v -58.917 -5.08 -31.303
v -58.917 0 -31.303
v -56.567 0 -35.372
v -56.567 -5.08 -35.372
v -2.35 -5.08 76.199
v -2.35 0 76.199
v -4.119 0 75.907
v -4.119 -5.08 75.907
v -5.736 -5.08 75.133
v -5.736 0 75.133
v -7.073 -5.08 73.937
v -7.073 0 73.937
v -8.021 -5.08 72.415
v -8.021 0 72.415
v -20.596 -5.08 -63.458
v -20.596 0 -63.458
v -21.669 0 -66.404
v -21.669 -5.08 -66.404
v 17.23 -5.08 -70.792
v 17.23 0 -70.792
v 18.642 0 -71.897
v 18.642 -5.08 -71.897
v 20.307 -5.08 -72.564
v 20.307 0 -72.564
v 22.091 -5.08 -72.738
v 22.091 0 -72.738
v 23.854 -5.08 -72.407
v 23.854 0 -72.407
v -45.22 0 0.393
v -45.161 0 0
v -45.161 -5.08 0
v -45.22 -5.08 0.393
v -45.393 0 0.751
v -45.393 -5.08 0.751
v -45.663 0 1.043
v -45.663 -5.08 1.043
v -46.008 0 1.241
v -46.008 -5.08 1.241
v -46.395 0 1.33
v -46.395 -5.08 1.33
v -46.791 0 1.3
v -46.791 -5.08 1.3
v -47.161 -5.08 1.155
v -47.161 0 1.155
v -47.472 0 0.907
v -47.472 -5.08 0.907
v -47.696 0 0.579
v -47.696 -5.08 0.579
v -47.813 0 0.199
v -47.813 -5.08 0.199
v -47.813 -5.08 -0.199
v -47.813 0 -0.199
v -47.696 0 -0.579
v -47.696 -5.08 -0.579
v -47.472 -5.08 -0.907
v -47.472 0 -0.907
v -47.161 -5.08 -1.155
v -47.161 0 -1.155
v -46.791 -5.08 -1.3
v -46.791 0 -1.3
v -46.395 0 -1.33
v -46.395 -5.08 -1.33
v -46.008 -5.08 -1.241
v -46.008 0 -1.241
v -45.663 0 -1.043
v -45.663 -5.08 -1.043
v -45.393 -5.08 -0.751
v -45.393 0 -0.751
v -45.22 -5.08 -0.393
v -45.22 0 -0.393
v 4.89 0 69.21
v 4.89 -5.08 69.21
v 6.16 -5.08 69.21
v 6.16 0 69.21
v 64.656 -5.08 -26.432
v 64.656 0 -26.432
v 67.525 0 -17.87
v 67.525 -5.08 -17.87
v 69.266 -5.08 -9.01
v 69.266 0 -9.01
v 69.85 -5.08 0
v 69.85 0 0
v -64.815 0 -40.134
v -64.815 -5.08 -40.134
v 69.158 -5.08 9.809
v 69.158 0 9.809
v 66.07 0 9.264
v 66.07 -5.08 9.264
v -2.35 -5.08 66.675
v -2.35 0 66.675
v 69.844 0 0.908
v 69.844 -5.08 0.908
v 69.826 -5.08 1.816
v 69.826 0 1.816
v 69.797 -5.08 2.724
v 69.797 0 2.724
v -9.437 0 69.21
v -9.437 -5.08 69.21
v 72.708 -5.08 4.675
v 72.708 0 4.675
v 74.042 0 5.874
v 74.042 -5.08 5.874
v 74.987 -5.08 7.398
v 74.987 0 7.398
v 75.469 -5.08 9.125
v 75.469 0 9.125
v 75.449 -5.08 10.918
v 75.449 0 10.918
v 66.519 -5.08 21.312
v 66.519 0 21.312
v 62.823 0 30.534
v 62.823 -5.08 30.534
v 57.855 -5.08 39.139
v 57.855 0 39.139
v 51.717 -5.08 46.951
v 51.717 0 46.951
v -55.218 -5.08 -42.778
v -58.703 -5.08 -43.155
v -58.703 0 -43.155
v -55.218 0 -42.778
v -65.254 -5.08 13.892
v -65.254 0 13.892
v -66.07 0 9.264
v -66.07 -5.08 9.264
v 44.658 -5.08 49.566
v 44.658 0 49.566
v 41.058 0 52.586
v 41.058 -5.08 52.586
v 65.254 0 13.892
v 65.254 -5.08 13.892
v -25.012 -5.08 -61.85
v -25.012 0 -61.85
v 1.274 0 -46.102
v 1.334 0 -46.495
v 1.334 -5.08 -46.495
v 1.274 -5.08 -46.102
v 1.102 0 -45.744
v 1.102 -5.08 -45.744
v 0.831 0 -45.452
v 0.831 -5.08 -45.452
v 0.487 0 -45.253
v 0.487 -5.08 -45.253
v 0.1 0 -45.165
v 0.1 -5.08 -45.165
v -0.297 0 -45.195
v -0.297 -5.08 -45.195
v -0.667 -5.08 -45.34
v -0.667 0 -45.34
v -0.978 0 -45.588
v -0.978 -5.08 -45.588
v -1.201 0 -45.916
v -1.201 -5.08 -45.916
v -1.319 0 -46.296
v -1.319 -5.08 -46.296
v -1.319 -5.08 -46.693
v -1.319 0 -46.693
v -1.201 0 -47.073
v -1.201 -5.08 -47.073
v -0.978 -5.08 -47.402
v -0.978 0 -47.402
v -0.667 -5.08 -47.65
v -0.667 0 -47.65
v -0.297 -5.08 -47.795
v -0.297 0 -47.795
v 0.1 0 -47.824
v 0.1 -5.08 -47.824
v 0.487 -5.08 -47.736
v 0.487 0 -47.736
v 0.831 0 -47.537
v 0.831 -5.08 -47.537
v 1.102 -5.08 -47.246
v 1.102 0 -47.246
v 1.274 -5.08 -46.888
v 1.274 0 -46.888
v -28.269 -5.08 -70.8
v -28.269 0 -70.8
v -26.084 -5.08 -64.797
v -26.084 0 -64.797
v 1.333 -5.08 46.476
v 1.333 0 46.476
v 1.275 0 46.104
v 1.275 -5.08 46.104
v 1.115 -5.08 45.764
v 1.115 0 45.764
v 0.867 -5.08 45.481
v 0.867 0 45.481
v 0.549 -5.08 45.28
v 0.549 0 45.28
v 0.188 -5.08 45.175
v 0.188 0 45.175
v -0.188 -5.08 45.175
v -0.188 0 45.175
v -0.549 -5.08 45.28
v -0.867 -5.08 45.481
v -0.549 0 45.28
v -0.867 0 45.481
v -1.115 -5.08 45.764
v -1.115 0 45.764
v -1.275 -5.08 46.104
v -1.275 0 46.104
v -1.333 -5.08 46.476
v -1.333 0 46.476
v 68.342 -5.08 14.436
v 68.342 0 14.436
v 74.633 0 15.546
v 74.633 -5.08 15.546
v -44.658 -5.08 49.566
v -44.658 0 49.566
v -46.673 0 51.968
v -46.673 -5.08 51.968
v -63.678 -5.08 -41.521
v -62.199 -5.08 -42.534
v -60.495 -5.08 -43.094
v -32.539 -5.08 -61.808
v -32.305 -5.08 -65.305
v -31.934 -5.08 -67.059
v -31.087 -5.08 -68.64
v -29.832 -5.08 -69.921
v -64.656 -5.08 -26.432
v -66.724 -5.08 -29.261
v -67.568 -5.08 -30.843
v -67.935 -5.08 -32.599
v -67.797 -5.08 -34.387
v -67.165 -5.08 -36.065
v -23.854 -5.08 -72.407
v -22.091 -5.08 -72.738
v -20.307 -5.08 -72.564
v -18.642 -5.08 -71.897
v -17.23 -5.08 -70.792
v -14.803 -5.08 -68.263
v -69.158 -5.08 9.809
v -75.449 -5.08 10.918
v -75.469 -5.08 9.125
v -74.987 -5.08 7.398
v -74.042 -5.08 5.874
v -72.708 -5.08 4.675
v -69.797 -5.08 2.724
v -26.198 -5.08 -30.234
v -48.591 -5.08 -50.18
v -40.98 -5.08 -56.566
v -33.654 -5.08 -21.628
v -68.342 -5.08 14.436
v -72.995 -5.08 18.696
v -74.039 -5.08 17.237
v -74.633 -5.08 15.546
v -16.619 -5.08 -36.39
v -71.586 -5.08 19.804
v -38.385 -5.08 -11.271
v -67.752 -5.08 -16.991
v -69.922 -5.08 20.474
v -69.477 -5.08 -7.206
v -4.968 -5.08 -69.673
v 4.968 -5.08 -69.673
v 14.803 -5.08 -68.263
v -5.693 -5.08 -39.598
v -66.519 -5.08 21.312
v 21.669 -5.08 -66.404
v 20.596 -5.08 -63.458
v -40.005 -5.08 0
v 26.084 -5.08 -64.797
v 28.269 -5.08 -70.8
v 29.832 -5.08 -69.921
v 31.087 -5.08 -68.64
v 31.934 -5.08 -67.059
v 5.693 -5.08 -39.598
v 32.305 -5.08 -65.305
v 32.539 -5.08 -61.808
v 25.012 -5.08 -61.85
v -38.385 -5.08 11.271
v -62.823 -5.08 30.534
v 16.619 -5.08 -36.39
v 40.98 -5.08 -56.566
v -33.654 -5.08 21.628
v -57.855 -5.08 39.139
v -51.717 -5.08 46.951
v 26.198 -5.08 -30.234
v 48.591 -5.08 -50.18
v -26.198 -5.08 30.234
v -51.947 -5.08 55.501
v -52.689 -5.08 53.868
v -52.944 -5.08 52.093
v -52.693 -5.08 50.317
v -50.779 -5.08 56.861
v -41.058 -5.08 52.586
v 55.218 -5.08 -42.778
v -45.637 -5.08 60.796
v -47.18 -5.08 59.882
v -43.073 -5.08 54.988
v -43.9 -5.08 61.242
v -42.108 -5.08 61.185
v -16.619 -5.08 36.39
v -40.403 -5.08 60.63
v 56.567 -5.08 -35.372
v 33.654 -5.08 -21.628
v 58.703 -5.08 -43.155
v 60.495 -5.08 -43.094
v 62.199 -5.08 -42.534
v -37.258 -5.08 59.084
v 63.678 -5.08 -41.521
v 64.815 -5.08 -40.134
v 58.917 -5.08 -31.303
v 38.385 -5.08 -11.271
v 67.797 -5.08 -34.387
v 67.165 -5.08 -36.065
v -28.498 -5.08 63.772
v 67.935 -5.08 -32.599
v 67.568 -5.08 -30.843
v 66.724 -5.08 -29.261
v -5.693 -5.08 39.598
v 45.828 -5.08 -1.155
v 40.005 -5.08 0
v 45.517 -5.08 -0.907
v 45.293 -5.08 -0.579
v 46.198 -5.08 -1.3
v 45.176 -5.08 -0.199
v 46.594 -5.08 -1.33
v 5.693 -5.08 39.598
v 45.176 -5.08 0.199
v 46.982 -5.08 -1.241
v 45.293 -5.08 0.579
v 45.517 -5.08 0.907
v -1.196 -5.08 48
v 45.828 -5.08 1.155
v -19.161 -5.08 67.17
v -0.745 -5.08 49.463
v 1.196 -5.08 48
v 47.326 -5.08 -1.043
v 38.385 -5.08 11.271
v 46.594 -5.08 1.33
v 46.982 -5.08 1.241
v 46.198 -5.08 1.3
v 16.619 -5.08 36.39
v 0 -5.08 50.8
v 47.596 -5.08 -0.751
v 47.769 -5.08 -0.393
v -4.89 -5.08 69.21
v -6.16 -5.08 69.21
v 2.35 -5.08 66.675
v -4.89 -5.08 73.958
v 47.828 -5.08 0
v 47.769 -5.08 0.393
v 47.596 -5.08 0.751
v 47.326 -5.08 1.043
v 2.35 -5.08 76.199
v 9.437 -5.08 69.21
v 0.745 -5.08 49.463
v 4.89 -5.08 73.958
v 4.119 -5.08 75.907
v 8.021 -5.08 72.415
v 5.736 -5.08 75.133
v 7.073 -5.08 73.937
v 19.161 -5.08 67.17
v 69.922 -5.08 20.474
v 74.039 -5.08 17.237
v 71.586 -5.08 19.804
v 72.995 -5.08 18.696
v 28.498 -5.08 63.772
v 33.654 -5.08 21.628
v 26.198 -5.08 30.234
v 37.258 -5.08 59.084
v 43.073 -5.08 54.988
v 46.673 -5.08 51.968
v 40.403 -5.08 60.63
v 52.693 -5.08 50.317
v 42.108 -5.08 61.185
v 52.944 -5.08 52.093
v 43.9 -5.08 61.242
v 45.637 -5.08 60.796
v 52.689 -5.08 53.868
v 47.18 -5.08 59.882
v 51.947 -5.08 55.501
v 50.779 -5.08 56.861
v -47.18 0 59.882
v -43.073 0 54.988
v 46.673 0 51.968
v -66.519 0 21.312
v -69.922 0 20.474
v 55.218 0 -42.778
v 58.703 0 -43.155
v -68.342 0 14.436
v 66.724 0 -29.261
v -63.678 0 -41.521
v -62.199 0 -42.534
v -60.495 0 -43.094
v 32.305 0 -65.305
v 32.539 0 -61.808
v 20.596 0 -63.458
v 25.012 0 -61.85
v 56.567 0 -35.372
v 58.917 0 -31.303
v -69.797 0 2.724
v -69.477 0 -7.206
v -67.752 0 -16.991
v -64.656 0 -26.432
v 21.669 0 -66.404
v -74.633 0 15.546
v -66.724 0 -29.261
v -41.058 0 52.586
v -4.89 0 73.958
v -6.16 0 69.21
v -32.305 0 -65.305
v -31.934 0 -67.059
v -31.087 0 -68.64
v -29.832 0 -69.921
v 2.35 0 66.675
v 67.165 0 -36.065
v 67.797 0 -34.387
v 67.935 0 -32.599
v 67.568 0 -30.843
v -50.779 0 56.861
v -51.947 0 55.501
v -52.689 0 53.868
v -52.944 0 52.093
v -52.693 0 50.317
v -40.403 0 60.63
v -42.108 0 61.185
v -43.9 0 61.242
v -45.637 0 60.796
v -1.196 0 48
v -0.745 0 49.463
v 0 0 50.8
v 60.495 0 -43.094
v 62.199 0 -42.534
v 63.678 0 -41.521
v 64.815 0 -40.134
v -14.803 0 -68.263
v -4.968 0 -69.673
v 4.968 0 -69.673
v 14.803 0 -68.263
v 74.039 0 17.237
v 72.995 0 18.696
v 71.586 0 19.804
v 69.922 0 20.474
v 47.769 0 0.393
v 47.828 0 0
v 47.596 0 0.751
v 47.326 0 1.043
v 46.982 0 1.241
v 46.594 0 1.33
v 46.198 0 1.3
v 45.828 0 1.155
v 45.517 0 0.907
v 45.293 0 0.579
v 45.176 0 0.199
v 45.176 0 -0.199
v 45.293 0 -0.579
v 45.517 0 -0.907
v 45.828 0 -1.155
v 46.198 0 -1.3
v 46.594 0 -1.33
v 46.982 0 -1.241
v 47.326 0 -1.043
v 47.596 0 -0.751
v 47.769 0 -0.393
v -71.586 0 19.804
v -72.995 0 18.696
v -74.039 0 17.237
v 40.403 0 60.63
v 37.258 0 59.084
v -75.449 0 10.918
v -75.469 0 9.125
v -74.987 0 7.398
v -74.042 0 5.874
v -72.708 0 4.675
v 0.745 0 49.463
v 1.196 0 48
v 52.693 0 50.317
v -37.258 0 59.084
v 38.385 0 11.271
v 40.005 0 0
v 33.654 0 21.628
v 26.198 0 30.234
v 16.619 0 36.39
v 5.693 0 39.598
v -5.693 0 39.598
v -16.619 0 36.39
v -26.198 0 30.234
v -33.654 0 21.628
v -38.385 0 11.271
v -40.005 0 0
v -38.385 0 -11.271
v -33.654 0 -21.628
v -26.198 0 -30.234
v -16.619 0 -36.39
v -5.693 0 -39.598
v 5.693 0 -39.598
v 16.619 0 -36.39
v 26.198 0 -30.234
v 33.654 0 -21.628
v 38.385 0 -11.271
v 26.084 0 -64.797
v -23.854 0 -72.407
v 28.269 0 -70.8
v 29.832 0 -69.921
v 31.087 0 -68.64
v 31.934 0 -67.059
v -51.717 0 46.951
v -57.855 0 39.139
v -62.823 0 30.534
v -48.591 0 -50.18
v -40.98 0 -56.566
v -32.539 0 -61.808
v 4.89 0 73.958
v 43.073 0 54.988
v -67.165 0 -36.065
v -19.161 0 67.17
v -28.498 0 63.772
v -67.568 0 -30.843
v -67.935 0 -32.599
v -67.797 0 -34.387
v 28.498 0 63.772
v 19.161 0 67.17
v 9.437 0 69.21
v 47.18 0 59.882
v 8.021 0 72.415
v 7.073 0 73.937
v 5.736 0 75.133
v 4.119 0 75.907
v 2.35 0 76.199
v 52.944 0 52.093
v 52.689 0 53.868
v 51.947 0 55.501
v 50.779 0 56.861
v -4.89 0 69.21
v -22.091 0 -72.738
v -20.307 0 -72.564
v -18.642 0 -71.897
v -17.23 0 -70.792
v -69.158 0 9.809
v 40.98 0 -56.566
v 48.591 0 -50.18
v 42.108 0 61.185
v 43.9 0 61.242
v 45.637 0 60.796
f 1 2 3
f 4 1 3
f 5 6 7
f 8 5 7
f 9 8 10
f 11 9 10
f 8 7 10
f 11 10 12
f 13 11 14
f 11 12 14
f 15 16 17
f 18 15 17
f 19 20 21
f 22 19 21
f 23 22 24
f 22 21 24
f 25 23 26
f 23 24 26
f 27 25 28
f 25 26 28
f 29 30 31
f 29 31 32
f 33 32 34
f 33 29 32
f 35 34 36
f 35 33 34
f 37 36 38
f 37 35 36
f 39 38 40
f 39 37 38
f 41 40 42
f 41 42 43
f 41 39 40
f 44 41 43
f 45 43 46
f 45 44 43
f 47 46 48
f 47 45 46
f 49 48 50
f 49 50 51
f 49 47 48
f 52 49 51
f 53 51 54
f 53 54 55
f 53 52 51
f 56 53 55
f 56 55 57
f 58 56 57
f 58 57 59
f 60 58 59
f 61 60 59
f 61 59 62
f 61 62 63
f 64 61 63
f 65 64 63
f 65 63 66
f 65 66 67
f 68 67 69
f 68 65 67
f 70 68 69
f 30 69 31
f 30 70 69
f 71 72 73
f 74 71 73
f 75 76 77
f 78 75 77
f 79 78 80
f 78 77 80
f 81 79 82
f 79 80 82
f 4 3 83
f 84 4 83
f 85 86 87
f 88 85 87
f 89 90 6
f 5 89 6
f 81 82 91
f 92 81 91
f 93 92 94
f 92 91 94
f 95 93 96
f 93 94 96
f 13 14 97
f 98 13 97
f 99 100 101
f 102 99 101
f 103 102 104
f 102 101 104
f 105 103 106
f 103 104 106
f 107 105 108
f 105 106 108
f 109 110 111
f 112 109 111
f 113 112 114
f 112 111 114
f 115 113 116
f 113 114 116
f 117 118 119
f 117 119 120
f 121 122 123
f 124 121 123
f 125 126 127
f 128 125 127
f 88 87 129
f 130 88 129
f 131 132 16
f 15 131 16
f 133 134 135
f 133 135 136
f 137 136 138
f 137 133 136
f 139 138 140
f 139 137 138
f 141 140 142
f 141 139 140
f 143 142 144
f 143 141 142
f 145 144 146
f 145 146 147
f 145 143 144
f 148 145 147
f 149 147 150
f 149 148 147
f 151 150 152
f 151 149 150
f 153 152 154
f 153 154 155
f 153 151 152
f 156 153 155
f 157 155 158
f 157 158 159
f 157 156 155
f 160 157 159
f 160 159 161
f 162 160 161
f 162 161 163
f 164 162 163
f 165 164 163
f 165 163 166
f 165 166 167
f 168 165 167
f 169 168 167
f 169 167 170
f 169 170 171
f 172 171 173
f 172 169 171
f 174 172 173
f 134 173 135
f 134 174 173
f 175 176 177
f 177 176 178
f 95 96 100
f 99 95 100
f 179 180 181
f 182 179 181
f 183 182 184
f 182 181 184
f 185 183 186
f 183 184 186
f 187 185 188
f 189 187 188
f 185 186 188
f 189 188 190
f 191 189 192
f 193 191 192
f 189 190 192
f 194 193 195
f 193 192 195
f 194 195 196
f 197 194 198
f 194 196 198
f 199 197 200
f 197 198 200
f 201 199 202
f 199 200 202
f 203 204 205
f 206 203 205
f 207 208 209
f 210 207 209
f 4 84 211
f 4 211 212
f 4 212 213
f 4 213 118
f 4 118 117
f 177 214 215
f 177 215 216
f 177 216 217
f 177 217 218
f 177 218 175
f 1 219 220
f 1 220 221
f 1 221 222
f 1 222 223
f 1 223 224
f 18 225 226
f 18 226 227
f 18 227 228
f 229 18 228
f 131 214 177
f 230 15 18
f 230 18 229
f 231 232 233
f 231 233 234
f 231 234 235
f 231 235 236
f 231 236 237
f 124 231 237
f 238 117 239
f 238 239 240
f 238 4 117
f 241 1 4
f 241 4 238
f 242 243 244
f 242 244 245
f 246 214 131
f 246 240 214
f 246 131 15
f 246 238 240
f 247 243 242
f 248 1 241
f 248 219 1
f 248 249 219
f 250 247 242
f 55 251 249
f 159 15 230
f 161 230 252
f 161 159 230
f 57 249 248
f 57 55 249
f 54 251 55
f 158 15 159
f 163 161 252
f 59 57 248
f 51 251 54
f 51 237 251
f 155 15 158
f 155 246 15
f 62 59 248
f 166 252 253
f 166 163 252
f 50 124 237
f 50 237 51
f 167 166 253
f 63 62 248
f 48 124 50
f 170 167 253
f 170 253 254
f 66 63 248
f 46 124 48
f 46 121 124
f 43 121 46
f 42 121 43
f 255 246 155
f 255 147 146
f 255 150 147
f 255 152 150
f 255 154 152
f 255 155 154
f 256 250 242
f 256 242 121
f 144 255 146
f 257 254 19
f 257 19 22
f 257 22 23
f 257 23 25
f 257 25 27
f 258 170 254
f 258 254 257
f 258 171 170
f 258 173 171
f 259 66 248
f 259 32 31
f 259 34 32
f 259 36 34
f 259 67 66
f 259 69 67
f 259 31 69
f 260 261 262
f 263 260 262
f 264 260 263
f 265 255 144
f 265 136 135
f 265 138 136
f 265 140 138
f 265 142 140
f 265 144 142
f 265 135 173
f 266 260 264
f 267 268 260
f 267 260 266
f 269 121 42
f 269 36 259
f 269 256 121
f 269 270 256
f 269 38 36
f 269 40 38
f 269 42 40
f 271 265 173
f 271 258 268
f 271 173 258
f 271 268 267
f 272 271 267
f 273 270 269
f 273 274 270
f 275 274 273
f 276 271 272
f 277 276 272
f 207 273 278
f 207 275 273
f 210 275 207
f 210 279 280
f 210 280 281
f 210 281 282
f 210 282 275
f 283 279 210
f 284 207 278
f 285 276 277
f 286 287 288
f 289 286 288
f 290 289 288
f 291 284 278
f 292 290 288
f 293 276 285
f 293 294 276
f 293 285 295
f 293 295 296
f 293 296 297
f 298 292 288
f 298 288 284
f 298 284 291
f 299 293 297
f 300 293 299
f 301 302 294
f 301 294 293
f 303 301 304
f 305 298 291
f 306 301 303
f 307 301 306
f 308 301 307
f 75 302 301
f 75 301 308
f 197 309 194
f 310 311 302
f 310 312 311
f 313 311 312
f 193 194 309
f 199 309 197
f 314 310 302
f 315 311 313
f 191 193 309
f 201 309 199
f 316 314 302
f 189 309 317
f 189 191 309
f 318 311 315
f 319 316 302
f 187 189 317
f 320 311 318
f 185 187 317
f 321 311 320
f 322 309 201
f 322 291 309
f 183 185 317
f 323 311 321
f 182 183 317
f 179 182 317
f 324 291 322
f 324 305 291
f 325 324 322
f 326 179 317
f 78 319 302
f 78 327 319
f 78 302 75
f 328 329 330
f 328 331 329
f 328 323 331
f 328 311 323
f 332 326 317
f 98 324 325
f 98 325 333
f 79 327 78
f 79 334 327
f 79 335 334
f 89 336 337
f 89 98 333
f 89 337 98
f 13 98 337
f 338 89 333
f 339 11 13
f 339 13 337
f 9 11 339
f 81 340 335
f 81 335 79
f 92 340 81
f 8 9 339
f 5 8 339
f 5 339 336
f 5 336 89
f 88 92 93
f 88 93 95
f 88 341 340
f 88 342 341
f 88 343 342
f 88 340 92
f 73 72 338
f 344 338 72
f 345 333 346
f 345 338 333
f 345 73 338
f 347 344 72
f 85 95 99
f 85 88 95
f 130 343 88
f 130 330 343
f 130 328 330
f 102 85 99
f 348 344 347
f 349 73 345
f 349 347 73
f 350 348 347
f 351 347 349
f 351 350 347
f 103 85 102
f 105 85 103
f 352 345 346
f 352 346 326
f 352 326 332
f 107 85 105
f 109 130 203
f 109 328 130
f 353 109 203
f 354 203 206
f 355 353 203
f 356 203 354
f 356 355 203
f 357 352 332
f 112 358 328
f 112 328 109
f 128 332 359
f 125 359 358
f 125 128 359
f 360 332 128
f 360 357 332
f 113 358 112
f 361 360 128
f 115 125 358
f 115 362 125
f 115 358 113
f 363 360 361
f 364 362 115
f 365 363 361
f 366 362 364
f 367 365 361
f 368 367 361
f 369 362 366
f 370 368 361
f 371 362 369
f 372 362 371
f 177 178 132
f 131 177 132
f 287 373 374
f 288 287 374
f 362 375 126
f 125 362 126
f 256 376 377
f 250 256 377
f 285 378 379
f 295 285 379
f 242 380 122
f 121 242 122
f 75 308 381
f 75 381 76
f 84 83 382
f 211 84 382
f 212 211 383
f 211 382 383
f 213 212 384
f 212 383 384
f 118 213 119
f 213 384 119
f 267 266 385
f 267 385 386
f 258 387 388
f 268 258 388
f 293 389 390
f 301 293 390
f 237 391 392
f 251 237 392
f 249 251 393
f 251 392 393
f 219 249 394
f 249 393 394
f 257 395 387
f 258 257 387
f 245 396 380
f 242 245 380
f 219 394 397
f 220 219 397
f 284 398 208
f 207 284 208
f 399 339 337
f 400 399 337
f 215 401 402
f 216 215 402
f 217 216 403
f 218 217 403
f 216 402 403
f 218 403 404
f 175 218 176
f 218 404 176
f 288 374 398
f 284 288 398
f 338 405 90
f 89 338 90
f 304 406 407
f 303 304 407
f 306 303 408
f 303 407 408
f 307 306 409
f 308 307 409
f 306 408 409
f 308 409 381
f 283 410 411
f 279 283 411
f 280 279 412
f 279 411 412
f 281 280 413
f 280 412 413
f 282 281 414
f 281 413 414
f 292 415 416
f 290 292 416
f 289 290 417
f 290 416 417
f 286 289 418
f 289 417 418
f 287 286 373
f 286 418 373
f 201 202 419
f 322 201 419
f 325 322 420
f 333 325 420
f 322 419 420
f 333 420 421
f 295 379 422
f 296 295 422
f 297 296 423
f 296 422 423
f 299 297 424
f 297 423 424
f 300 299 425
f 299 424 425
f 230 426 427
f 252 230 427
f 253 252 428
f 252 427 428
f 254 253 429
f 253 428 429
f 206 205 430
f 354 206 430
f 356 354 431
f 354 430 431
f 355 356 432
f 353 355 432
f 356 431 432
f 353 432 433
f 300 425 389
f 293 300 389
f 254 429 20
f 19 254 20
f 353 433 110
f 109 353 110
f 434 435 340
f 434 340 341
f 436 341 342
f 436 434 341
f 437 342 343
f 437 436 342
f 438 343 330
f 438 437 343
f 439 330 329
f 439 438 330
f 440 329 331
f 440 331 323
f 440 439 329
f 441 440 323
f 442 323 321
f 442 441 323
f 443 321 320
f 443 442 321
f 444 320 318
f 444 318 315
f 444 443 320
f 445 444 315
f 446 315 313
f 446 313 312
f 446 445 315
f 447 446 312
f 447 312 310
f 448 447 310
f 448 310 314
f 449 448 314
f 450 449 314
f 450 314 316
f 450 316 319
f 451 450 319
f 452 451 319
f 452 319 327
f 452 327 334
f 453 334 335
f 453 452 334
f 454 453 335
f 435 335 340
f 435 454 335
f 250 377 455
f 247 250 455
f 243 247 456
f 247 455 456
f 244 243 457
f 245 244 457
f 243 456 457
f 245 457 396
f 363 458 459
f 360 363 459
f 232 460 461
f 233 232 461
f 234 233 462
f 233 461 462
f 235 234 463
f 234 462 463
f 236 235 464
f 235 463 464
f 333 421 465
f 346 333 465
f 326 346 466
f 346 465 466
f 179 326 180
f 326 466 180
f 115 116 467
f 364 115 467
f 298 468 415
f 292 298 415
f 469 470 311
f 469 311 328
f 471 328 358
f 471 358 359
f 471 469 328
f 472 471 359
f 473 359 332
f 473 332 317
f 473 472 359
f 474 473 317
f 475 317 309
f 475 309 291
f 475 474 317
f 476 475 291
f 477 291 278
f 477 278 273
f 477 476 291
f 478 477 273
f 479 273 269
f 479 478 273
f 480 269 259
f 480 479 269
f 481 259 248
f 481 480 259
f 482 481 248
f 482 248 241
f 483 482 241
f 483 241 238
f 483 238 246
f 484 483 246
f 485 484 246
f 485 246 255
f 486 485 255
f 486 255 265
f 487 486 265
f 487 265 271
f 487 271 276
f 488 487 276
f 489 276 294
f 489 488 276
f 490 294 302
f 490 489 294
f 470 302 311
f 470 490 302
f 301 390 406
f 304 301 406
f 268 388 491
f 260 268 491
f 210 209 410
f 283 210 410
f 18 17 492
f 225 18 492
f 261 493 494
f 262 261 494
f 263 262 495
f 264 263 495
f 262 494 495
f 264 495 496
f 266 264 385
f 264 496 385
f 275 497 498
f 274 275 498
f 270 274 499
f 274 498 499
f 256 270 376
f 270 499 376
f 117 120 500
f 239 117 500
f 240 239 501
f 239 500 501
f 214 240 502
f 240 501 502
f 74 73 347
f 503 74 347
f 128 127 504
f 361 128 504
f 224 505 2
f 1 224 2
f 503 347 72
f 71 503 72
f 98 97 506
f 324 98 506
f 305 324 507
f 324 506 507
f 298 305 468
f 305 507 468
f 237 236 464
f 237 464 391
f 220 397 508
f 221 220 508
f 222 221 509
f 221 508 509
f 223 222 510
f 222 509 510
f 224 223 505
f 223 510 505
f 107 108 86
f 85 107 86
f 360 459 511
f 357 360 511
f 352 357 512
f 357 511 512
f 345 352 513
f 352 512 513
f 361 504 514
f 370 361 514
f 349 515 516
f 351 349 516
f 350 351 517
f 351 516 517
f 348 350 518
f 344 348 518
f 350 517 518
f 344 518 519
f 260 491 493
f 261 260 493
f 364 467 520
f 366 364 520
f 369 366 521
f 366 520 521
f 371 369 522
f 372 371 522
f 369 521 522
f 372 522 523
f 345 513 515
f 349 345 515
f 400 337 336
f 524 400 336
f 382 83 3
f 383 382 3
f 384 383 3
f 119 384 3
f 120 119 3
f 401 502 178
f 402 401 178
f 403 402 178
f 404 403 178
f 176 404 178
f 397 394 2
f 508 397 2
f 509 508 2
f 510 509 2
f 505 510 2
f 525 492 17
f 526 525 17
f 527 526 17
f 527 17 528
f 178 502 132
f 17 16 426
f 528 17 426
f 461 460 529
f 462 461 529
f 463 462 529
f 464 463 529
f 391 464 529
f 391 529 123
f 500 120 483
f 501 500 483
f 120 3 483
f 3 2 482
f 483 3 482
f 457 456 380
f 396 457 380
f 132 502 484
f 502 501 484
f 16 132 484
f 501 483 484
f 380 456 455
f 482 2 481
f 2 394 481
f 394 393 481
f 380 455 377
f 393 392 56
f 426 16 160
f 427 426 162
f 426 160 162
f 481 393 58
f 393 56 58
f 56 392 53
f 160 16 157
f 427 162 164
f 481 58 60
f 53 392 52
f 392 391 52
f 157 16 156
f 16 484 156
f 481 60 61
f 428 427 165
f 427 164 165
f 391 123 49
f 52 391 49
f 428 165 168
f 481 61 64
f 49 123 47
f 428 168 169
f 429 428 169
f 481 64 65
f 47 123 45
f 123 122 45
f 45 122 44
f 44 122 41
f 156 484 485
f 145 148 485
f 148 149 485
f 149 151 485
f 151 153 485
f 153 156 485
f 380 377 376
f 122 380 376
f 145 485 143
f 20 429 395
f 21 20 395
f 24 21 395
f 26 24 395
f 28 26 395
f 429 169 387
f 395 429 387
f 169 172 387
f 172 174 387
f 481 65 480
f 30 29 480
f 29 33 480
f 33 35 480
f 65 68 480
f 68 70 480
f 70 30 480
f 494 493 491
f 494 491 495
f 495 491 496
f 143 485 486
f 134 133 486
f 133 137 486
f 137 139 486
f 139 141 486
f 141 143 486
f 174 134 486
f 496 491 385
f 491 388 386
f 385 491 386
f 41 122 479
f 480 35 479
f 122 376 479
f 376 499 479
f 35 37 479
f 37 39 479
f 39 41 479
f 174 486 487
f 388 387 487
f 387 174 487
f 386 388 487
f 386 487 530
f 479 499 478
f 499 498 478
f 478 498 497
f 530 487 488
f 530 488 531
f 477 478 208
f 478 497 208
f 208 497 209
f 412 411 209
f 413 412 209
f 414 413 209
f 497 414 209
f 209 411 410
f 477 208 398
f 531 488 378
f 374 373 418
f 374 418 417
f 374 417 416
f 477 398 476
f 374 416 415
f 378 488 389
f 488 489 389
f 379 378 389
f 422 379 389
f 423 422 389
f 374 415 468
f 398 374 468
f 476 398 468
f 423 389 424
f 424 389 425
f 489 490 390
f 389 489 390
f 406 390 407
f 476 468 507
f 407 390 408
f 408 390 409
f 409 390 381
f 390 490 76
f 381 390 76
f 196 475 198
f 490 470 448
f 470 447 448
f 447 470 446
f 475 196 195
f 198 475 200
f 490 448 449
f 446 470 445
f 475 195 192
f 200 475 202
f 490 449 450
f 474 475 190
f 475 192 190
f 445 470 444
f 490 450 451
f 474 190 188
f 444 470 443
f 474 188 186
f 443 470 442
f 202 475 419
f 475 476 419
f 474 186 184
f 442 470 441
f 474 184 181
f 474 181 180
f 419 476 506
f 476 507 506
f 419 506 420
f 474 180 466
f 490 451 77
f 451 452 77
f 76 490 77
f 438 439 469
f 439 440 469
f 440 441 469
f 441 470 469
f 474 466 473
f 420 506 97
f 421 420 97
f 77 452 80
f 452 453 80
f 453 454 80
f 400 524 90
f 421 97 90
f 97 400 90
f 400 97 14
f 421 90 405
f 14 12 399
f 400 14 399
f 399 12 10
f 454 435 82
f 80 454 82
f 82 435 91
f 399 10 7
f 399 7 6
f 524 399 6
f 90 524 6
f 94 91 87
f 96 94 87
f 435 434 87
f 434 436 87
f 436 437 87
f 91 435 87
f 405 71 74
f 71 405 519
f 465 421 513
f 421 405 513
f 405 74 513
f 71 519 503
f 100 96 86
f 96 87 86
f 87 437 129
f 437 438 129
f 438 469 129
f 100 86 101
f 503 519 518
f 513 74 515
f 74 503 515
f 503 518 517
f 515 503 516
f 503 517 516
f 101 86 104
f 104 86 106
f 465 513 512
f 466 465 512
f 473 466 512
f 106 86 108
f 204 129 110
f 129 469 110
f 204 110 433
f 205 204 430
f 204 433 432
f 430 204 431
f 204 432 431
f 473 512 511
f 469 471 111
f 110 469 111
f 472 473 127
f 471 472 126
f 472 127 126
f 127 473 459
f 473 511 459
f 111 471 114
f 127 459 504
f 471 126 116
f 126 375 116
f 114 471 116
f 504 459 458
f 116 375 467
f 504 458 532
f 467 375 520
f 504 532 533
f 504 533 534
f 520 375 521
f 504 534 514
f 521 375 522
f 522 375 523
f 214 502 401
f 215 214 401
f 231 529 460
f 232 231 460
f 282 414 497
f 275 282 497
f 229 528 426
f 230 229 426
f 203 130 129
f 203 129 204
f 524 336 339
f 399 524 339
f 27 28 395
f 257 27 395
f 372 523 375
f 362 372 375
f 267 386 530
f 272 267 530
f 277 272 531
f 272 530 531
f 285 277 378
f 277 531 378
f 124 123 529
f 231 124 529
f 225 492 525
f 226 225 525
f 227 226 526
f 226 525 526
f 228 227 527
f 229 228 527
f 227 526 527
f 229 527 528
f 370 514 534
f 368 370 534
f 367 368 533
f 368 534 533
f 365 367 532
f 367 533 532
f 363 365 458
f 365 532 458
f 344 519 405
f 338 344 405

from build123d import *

# Parameters (mm, degrees)
F0_R     = 1.3335
F0_R_2   = 40.005
F1_DEPTH = 5.08
F3_DEPTH = 5.08


with BuildPart() as f1:
    # F0 (on Front) → F1 (new body)
    with BuildSketch(Plane.XZ):
        with BuildLine():
            ThreePointArc((64.6559292996, -26.4316724103), (68.5391828138, -13.4685900974), (69.85, 0))
            ThreePointArc((69.85, 0), (69.8367147463, 1.3622677557), (69.796864039, 2.7240173131))
            ThreePointArc((69.796864039, 2.7240173131), (69.5676178372, 6.2744759504), (69.1578829213, 9.8086558631))
            Line((69.1578829213, 9.8086558631), (66.0700433255, 9.2641864302))
            Line((66.0700433255, 9.2641864302), (65.2540705387, 13.8917980616))
            Line((65.2540705387, 13.8917980616), (68.3419101345, 14.4362674945))
            ThreePointArc((68.3419101345, 14.4362674945), (67.5181742912, 17.8974478736), (66.5192668833, 21.3121944743))
            ThreePointArc((66.5192668833, 21.3121944743), (60.4918744543, 34.925), (51.7165352668, 46.9512777249))
            ThreePointArc((51.7165352668, 46.9512777249), (49.258731667, 49.5237302165), (46.6731294533, 51.9676965724))
            Line((46.6731294533, 51.9676965724), (44.657685295, 49.565783756))
            Line((44.657685295, 49.565783756), (41.0580424567, 52.5862427339))
            Line((41.0580424567, 52.5862427339), (43.0734866151, 54.9881555503))
            ThreePointArc((43.0734866151, 54.9881555503), (40.2176644871, 57.1100863526), (37.257500213, 59.0838487057))
            ThreePointArc((37.257500213, 59.0838487057), (23.8901070113, 65.6375295619), (9.4374648779, 69.2095134839))
            ThreePointArc((9.4374648779, 69.2095134839), (5.9011375, 69.6002807193), (2.3495, 69.8104744988))
            Line((2.3495, 69.8104744988), (2.3495, 66.675))
            Line((2.3495, 66.675), (-2.3495, 66.675))
            Line((-2.3495, 66.675), (-2.3495, 69.8104744988))
            ThreePointArc((-2.3495, 69.8104744988), (-5.9011375, 69.6002807193), (-9.4374648779, 69.2095134839))
            ThreePointArc((-9.4374648779, 69.2095134839), (-23.8901070113, 65.6375295619), (-37.257500213, 59.0838487057))
            ThreePointArc((-37.257500213, 59.0838487057), (-40.2176644871, 57.1100863526), (-43.0734866151, 54.9881555503))
            Line((-43.0734866151, 54.9881555503), (-41.0580424567, 52.5862427339))
            Line((-41.0580424567, 52.5862427339), (-44.657685295, 49.565783756))
            Line((-44.657685295, 49.565783756), (-46.6731294533, 51.9676965724))
            ThreePointArc((-46.6731294533, 51.9676965724), (-49.258731667, 49.5237302165), (-51.7165352668, 46.9512777249))
            ThreePointArc((-51.7165352668, 46.9512777249), (-60.4918744543, 34.925), (-66.5192668833, 21.3121944743))
            ThreePointArc((-66.5192668833, 21.3121944743), (-67.5181742912, 17.8974478736), (-68.3419101345, 14.4362674945))
            Line((-68.3419101345, 14.4362674945), (-65.2540705387, 13.8917980616))
            Line((-65.2540705387, 13.8917980616), (-66.0700433255, 9.2641864302))
            Line((-66.0700433255, 9.2641864302), (-69.1578829213, 9.8086558631))
            ThreePointArc((-69.1578829213, 9.8086558631), (-69.5676178372, 6.2744759504), (-69.796864039, 2.7240173131))
            ThreePointArc((-69.796864039, 2.7240173131), (-68.7888215479, -12.12932521), (-64.6559292996, -26.4316724103))
            ThreePointArc((-64.6559292996, -26.4316724103), (-63.2261799634, -29.6896053734), (-61.6323943662, -32.8705105632))
            Line((-61.6323943662, -32.8705105632), (-58.9169937973, -31.3027733138))
            Line((-58.9169937973, -31.3027733138), (-56.5674937973, -35.3722266862))
            Line((-56.5674937973, -35.3722266862), (-59.2828943662, -36.9399639356))
            ThreePointArc((-59.2828943662, -36.9399639356), (-57.3250424634, -39.9106753459), (-55.2184644216, -42.7778410736))
            ThreePointArc((-55.2184644216, -42.7778410736), (-44.8987145366, -53.5082043519), (-32.539363826, -61.8078660188))
            ThreePointArc((-32.539363826, -61.8078660188), (-29.3499533501, -63.384562303), (-26.0843963063, -64.7968114134))
            Line((-26.0843963063, -64.7968114134), (-25.0120008688, -61.8504291642))
            Line((-25.0120008688, -61.8504291642), (-20.5963852437, -63.4575818176))
            Line((-20.5963852437, -63.4575818176), (-21.6687806812, -66.4039640668))
            ThreePointArc((-21.6687806812, -66.4039640668), (-18.2594426241, -67.4211780901), (-14.8027316165, -68.2634721992))
            ThreePointArc((-14.8027316165, -68.2634721992), (0, -69.85), (14.8027316165, -68.2634721992))
            ThreePointArc((14.8027316165, -68.2634721992), (18.2594426241, -67.4211780901), (21.6687806812, -66.4039640668))
            Line((21.6687806812, -66.4039640668), (20.5963852437, -63.4575818176))
            Line((20.5963852437, -63.4575818176), (25.0120008688, -61.8504291642))
            Line((25.0120008688, -61.8504291642), (26.0843963063, -64.7968114134))
            ThreePointArc((26.0843963063, -64.7968114134), (29.3499533501, -63.384562303), (32.539363826, -61.8078660188))
            ThreePointArc((32.539363826, -61.8078660188), (44.8987145366, -53.5082043519), (55.2184644216, -42.7778410736))
            ThreePointArc((55.2184644216, -42.7778410736), (57.3250424634, -39.9106753459), (59.2828943662, -36.9399639356))
            Line((59.2828943662, -36.9399639356), (56.5674937973, -35.3722266862))
            Line((56.5674937973, -35.3722266862), (58.9169937973, -31.3027733138))
            Line((58.9169937973, -31.3027733138), (61.6323943662, -32.8705105632))
            ThreePointArc((61.6323943662, -32.8705105632), (63.2261799634, -29.6896053734), (64.6559292996, -26.4316724103))
        make_face()
        with Locations((-46.4947, 0)):
            Circle(F0_R, mode=Mode.SUBTRACT)
        with Locations((0, -46.4947)):
            Circle(F0_R, mode=Mode.SUBTRACT)
        Circle(F0_R_2, mode=Mode.SUBTRACT)
        with Locations((46.4947, 0)):
            Circle(F0_R, mode=Mode.SUBTRACT)
        with BuildLine():
            ThreePointArc((1.3333628788, 46.4755771511), (0, 45.1612), (-1.3333628788, 46.4755771511))
            ThreePointArc((-1.3333628788, 46.4755771511), (-1.0083284803, 48.7431296807), (0, 50.8))
            ThreePointArc((0, 50.8), (1.0083284803, 48.7431296807), (1.3333628788, 46.4755771511))
        make_face(mode=Mode.SUBTRACT)
        with BuildLine():
            ThreePointArc((-43.0734866151, 54.9881555503), (-40.2176644871, 57.1100863526), (-37.257500213, 59.0838487057))
            Line((-37.257500213, 59.0838487057), (-40.4029688253, 60.6296034594))
            ThreePointArc((-40.4029688253, 60.6296034594), (-43.9001960603, 61.242248794), (-47.1796486938, 59.8816889594))
            Line((-47.1796486938, 59.8816889594), (-43.0734866151, 54.9881555503))
        make_face()
        with BuildLine():
            ThreePointArc((-51.7165352668, 46.9512777249), (-49.258731667, 49.5237302165), (-46.6731294533, 51.9676965724))
            Line((-46.6731294533, 51.9676965724), (-50.779291532, 56.8612299815))
            ThreePointArc((-50.779291532, 56.8612299815), (-52.6886523792, 53.8678583382), (-52.69260164, 50.3173770972))
            Line((-52.69260164, 50.3173770972), (-51.7165352668, 46.9512777249))
        make_face()
        with BuildLine():
            ThreePointArc((-9.4374648779, 69.2095134839), (-5.9011375, 69.6002807193), (-2.3495, 69.8104744988))
            Line((-2.3495, 69.8104744988), (-2.3495, 76.1985286816))
            ThreePointArc((-2.3495, 76.1985286816), (-5.7362574703, 75.1327864631), (-8.0214881298, 72.415498574))
            Line((-8.0214881298, 72.415498574), (-9.4374648779, 69.2095134839))
        make_face()
        with BuildLine():
            ThreePointArc((2.3495, 69.8104744988), (5.9011375, 69.6002807193), (9.4374648779, 69.2095134839))
            Line((9.4374648779, 69.2095134839), (8.0214881298, 72.415498574))
            ThreePointArc((8.0214881298, 72.415498574), (5.7362574703, 75.1327864631), (2.3495, 76.1985286816))
            Line((2.3495, 76.1985286816), (2.3495, 69.8104744988))
        make_face()
        with BuildLine():
            ThreePointArc((37.257500213, 59.0838487057), (40.2176644871, 57.1100863526), (43.0734866151, 54.9881555503))
            Line((43.0734866151, 54.9881555503), (47.1796486938, 59.8816889594))
            ThreePointArc((47.1796486938, 59.8816889594), (43.9001960603, 61.242248794), (40.4029688253, 60.6296034594))
            Line((40.4029688253, 60.6296034594), (37.257500213, 59.0838487057))
        make_face()
        with BuildLine():
            ThreePointArc((46.6731294533, 51.9676965724), (49.258731667, 49.5237302165), (51.7165352668, 46.9512777249))
            Line((51.7165352668, 46.9512777249), (52.69260164, 50.3173770972))
            ThreePointArc((52.69260164, 50.3173770972), (52.6886523792, 53.8678583382), (50.779291532, 56.8612299815))
            Line((50.779291532, 56.8612299815), (46.6731294533, 51.9676965724))
        make_face()
        with BuildLine():
            ThreePointArc((66.5192668833, 21.3121944743), (67.5181742912, 17.8974478736), (68.3419101345, 14.4362674945))
            Line((68.3419101345, 14.4362674945), (74.6329154204, 15.5455414622))
            ThreePointArc((74.6329154204, 15.5455414622), (72.9952599579, 18.6957822824), (69.922427638, 20.4744430631))
            Line((69.922427638, 20.4744430631), (66.5192668833, 21.3121944743))
        make_face()
        with BuildLine():
            ThreePointArc((69.1578829213, 9.8086558631), (69.5676178372, 6.2744759504), (69.796864039, 2.7240173131))
            Line((69.796864039, 2.7240173131), (72.7082612299, 4.6751956613))
            ThreePointArc((72.7082612299, 4.6751956613), (74.9874412706, 7.3975606223), (75.4488882072, 10.9179298308))
            Line((75.4488882072, 10.9179298308), (69.1578829213, 9.8086558631))
        make_face()
        with BuildLine():
            Line((66.7244054577, -29.2609367904), (64.6559292996, -26.4316724103))
            ThreePointArc((64.6559292996, -26.4316724103), (63.2261799634, -29.6896053734), (61.6323943662, -32.8705105632))
            Line((61.6323943662, -32.8705105632), (67.1646115693, -36.0645376546))
            ThreePointArc((67.1646115693, -36.0645376546), (67.9350304693, -32.5986485396), (66.7244054577, -29.2609367904))
        make_face()
        with BuildLine():
            Line((64.8151115693, -40.133991027), (59.2828943662, -36.9399639356))
            ThreePointArc((59.2828943662, -36.9399639356), (57.3250424634, -39.9106753459), (55.2184644216, -42.7778410736))
            Line((55.2184644216, -42.7778410736), (58.7029173279, -43.1545617836))
            ThreePointArc((58.7029173279, -43.1545617836), (62.198772999, -42.5341379235), (64.8151115693, -40.133991027))
        make_face()
        with BuildLine():
            Line((23.8536238884, -72.4067714436), (21.6687806812, -66.4039640668))
            ThreePointArc((21.6687806812, -66.4039640668), (18.2594426241, -67.4211780901), (14.8027316165, -68.2634721992))
            Line((14.8027316165, -68.2634721992), (17.229825998, -70.7918201604))
            ThreePointArc((17.229825998, -70.7918201604), (20.3066075788, -72.5636406206), (23.8536238884, -72.4067714436))
        make_face()
        with BuildLine():
            Line((32.3052924046, -65.3047991207), (32.539363826, -61.8078660188))
            ThreePointArc((32.539363826, -61.8078660188), (29.3499533501, -63.384562303), (26.0843963063, -64.7968114134))
            Line((26.0843963063, -64.7968114134), (28.2692395134, -70.7996187901))
            ThreePointArc((28.2692395134, -70.7996187901), (31.0872452104, -68.6398094163), (32.3052924046, -65.3047991207))
        make_face()
        with BuildLine():
            Line((-28.2692395134, -70.7996187901), (-26.0843963063, -64.7968114134))
            ThreePointArc((-26.0843963063, -64.7968114134), (-29.3499533501, -63.384562303), (-32.539363826, -61.8078660188))
            Line((-32.539363826, -61.8078660188), (-32.3052924046, -65.3047991207))
            ThreePointArc((-32.3052924046, -65.3047991207), (-31.0872452104, -68.6398094163), (-28.2692395134, -70.7996187901))
        make_face()
        with BuildLine():
            Line((-17.229825998, -70.7918201604), (-14.8027316165, -68.2634721992))
            ThreePointArc((-14.8027316165, -68.2634721992), (-18.2594426241, -67.4211780901), (-21.6687806812, -66.4039640668))
            Line((-21.6687806812, -66.4039640668), (-23.8536238884, -72.4067714436))
            ThreePointArc((-23.8536238884, -72.4067714436), (-20.3066075788, -72.5636406206), (-17.229825998, -70.7918201604))
        make_face()
        with BuildLine():
            Line((-58.7029173279, -43.1545617836), (-55.2184644216, -42.7778410736))
            ThreePointArc((-55.2184644216, -42.7778410736), (-57.3250424634, -39.9106753459), (-59.2828943662, -36.9399639356))
            Line((-59.2828943662, -36.9399639356), (-64.8151115693, -40.133991027))
            ThreePointArc((-64.8151115693, -40.133991027), (-62.198772999, -42.5341379235), (-58.7029173279, -43.1545617836))
        make_face()
        with BuildLine():
            Line((-67.1646115693, -36.0645376546), (-61.6323943662, -32.8705105632))
            ThreePointArc((-61.6323943662, -32.8705105632), (-63.2261799634, -29.6896053734), (-64.6559292996, -26.4316724103))
            Line((-64.6559292996, -26.4316724103), (-66.7244054577, -29.2609367904))
            ThreePointArc((-66.7244054577, -29.2609367904), (-67.9350304693, -32.5986485396), (-67.1646115693, -36.0645376546))
        make_face()
        with BuildLine():
            Line((-72.7082612299, 4.6751956613), (-69.796864039, 2.7240173131))
            ThreePointArc((-69.796864039, 2.7240173131), (-69.5676178372, 6.2744759504), (-69.1578829213, 9.8086558631))
            Line((-69.1578829213, 9.8086558631), (-75.4488882072, 10.9179298308))
            ThreePointArc((-75.4488882072, 10.9179298308), (-74.9874412706, 7.3975606223), (-72.7082612299, 4.6751956613))
        make_face()
        with BuildLine():
            ThreePointArc((-68.3419101345, 14.4362674945), (-67.5181742912, 17.8974478736), (-66.5192668833, 21.3121944743))
            Line((-66.5192668833, 21.3121944743), (-69.922427638, 20.4744430631))
            ThreePointArc((-69.922427638, 20.4744430631), (-72.9952599579, 18.6957822824), (-74.6329154204, 15.5455414622))
            Line((-74.6329154204, 15.5455414622), (-68.3419101345, 14.4362674945))
        make_face()
    extrude(amount=F1_DEPTH)

    # F2 (on face) → F3 (cut, through all)
    with BuildSketch(Plane.XZ.offset(5.08)):
        Polygon((-4.8895, 69.2095134839), (-4.8895, 73.9583384527), (-6.1595, 69.2095134839), align=None)
        Polygon((6.1595, 69.2095134839), (4.8895, 73.9583384527), (4.8895, 69.2095134839), align=None)
    extrude(amount=-F3_DEPTH, mode=Mode.SUBTRACT)


solid = f1.part
